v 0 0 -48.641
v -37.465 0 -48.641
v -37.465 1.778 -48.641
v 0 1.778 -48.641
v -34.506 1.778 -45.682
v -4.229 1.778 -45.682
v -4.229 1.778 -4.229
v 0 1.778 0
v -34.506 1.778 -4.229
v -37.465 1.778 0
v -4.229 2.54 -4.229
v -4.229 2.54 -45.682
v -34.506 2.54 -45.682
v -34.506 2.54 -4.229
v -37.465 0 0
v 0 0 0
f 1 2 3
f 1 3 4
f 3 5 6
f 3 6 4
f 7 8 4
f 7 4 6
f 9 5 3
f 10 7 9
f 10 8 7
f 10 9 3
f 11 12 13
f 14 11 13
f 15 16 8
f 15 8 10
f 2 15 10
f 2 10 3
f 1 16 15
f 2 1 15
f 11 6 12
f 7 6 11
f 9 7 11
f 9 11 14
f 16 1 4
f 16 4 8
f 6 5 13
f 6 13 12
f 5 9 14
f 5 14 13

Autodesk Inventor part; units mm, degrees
ref_plane "YZ Plane" through (0, 0, 0) normal (1, 0, 0) x (0, 1, 0)
ref_plane "XZ Plane" through (0, 0, 0) normal (0, 1, 0) x (-1, 0, 0)
ref_plane "XY Plane" through (0, 0, 0) normal (0, 0, 1) x (1, 0, 0)
sketch "Sketch1" plane through (0, 0, 0) normal (0, 1, 0) x (-1, 0, 0)
  line L0 (0, 0) -> (37.465, 0)
  line L1 (37.465, 0) -> (37.465, -48.641)
  line L2 (37.465, -48.641) -> (0, -48.641)
  line L3 (0, -48.641) -> (0, 0)
  line L4 (4.2291, -4.2291) -> (34.5059, -4.2291)
  line L5 (34.5059, -4.2291) -> (34.5059, -45.6819)
  line L6 (34.5059, -45.6819) -> (4.2291, -45.6819)
  line L7 (4.2291, -45.6819) -> (4.2291, -4.2291)
  line L8 (4.2291, -4.2291) -> (34.5059, -45.6819) construction
  line L9 (34.5059, -4.2291) -> (4.2291, -45.6819) construction
  point P0 (19.3675, -24.9555)
  dimension "d0" = 37.465
  dimension "d1" = 48.641
  dimension "d2" = 30.2768
  dimension "d3" = 41.4528
extrude "Extrusion1" add sketch "Sketch1" along normal blind 2.54 contours L4 L5 L6 L7
extrude "Extrusion2" add sketch "Sketch1" along normal blind 1.778
properties part number "Valve Holder-3valve-withwirebox-lidforbox"
